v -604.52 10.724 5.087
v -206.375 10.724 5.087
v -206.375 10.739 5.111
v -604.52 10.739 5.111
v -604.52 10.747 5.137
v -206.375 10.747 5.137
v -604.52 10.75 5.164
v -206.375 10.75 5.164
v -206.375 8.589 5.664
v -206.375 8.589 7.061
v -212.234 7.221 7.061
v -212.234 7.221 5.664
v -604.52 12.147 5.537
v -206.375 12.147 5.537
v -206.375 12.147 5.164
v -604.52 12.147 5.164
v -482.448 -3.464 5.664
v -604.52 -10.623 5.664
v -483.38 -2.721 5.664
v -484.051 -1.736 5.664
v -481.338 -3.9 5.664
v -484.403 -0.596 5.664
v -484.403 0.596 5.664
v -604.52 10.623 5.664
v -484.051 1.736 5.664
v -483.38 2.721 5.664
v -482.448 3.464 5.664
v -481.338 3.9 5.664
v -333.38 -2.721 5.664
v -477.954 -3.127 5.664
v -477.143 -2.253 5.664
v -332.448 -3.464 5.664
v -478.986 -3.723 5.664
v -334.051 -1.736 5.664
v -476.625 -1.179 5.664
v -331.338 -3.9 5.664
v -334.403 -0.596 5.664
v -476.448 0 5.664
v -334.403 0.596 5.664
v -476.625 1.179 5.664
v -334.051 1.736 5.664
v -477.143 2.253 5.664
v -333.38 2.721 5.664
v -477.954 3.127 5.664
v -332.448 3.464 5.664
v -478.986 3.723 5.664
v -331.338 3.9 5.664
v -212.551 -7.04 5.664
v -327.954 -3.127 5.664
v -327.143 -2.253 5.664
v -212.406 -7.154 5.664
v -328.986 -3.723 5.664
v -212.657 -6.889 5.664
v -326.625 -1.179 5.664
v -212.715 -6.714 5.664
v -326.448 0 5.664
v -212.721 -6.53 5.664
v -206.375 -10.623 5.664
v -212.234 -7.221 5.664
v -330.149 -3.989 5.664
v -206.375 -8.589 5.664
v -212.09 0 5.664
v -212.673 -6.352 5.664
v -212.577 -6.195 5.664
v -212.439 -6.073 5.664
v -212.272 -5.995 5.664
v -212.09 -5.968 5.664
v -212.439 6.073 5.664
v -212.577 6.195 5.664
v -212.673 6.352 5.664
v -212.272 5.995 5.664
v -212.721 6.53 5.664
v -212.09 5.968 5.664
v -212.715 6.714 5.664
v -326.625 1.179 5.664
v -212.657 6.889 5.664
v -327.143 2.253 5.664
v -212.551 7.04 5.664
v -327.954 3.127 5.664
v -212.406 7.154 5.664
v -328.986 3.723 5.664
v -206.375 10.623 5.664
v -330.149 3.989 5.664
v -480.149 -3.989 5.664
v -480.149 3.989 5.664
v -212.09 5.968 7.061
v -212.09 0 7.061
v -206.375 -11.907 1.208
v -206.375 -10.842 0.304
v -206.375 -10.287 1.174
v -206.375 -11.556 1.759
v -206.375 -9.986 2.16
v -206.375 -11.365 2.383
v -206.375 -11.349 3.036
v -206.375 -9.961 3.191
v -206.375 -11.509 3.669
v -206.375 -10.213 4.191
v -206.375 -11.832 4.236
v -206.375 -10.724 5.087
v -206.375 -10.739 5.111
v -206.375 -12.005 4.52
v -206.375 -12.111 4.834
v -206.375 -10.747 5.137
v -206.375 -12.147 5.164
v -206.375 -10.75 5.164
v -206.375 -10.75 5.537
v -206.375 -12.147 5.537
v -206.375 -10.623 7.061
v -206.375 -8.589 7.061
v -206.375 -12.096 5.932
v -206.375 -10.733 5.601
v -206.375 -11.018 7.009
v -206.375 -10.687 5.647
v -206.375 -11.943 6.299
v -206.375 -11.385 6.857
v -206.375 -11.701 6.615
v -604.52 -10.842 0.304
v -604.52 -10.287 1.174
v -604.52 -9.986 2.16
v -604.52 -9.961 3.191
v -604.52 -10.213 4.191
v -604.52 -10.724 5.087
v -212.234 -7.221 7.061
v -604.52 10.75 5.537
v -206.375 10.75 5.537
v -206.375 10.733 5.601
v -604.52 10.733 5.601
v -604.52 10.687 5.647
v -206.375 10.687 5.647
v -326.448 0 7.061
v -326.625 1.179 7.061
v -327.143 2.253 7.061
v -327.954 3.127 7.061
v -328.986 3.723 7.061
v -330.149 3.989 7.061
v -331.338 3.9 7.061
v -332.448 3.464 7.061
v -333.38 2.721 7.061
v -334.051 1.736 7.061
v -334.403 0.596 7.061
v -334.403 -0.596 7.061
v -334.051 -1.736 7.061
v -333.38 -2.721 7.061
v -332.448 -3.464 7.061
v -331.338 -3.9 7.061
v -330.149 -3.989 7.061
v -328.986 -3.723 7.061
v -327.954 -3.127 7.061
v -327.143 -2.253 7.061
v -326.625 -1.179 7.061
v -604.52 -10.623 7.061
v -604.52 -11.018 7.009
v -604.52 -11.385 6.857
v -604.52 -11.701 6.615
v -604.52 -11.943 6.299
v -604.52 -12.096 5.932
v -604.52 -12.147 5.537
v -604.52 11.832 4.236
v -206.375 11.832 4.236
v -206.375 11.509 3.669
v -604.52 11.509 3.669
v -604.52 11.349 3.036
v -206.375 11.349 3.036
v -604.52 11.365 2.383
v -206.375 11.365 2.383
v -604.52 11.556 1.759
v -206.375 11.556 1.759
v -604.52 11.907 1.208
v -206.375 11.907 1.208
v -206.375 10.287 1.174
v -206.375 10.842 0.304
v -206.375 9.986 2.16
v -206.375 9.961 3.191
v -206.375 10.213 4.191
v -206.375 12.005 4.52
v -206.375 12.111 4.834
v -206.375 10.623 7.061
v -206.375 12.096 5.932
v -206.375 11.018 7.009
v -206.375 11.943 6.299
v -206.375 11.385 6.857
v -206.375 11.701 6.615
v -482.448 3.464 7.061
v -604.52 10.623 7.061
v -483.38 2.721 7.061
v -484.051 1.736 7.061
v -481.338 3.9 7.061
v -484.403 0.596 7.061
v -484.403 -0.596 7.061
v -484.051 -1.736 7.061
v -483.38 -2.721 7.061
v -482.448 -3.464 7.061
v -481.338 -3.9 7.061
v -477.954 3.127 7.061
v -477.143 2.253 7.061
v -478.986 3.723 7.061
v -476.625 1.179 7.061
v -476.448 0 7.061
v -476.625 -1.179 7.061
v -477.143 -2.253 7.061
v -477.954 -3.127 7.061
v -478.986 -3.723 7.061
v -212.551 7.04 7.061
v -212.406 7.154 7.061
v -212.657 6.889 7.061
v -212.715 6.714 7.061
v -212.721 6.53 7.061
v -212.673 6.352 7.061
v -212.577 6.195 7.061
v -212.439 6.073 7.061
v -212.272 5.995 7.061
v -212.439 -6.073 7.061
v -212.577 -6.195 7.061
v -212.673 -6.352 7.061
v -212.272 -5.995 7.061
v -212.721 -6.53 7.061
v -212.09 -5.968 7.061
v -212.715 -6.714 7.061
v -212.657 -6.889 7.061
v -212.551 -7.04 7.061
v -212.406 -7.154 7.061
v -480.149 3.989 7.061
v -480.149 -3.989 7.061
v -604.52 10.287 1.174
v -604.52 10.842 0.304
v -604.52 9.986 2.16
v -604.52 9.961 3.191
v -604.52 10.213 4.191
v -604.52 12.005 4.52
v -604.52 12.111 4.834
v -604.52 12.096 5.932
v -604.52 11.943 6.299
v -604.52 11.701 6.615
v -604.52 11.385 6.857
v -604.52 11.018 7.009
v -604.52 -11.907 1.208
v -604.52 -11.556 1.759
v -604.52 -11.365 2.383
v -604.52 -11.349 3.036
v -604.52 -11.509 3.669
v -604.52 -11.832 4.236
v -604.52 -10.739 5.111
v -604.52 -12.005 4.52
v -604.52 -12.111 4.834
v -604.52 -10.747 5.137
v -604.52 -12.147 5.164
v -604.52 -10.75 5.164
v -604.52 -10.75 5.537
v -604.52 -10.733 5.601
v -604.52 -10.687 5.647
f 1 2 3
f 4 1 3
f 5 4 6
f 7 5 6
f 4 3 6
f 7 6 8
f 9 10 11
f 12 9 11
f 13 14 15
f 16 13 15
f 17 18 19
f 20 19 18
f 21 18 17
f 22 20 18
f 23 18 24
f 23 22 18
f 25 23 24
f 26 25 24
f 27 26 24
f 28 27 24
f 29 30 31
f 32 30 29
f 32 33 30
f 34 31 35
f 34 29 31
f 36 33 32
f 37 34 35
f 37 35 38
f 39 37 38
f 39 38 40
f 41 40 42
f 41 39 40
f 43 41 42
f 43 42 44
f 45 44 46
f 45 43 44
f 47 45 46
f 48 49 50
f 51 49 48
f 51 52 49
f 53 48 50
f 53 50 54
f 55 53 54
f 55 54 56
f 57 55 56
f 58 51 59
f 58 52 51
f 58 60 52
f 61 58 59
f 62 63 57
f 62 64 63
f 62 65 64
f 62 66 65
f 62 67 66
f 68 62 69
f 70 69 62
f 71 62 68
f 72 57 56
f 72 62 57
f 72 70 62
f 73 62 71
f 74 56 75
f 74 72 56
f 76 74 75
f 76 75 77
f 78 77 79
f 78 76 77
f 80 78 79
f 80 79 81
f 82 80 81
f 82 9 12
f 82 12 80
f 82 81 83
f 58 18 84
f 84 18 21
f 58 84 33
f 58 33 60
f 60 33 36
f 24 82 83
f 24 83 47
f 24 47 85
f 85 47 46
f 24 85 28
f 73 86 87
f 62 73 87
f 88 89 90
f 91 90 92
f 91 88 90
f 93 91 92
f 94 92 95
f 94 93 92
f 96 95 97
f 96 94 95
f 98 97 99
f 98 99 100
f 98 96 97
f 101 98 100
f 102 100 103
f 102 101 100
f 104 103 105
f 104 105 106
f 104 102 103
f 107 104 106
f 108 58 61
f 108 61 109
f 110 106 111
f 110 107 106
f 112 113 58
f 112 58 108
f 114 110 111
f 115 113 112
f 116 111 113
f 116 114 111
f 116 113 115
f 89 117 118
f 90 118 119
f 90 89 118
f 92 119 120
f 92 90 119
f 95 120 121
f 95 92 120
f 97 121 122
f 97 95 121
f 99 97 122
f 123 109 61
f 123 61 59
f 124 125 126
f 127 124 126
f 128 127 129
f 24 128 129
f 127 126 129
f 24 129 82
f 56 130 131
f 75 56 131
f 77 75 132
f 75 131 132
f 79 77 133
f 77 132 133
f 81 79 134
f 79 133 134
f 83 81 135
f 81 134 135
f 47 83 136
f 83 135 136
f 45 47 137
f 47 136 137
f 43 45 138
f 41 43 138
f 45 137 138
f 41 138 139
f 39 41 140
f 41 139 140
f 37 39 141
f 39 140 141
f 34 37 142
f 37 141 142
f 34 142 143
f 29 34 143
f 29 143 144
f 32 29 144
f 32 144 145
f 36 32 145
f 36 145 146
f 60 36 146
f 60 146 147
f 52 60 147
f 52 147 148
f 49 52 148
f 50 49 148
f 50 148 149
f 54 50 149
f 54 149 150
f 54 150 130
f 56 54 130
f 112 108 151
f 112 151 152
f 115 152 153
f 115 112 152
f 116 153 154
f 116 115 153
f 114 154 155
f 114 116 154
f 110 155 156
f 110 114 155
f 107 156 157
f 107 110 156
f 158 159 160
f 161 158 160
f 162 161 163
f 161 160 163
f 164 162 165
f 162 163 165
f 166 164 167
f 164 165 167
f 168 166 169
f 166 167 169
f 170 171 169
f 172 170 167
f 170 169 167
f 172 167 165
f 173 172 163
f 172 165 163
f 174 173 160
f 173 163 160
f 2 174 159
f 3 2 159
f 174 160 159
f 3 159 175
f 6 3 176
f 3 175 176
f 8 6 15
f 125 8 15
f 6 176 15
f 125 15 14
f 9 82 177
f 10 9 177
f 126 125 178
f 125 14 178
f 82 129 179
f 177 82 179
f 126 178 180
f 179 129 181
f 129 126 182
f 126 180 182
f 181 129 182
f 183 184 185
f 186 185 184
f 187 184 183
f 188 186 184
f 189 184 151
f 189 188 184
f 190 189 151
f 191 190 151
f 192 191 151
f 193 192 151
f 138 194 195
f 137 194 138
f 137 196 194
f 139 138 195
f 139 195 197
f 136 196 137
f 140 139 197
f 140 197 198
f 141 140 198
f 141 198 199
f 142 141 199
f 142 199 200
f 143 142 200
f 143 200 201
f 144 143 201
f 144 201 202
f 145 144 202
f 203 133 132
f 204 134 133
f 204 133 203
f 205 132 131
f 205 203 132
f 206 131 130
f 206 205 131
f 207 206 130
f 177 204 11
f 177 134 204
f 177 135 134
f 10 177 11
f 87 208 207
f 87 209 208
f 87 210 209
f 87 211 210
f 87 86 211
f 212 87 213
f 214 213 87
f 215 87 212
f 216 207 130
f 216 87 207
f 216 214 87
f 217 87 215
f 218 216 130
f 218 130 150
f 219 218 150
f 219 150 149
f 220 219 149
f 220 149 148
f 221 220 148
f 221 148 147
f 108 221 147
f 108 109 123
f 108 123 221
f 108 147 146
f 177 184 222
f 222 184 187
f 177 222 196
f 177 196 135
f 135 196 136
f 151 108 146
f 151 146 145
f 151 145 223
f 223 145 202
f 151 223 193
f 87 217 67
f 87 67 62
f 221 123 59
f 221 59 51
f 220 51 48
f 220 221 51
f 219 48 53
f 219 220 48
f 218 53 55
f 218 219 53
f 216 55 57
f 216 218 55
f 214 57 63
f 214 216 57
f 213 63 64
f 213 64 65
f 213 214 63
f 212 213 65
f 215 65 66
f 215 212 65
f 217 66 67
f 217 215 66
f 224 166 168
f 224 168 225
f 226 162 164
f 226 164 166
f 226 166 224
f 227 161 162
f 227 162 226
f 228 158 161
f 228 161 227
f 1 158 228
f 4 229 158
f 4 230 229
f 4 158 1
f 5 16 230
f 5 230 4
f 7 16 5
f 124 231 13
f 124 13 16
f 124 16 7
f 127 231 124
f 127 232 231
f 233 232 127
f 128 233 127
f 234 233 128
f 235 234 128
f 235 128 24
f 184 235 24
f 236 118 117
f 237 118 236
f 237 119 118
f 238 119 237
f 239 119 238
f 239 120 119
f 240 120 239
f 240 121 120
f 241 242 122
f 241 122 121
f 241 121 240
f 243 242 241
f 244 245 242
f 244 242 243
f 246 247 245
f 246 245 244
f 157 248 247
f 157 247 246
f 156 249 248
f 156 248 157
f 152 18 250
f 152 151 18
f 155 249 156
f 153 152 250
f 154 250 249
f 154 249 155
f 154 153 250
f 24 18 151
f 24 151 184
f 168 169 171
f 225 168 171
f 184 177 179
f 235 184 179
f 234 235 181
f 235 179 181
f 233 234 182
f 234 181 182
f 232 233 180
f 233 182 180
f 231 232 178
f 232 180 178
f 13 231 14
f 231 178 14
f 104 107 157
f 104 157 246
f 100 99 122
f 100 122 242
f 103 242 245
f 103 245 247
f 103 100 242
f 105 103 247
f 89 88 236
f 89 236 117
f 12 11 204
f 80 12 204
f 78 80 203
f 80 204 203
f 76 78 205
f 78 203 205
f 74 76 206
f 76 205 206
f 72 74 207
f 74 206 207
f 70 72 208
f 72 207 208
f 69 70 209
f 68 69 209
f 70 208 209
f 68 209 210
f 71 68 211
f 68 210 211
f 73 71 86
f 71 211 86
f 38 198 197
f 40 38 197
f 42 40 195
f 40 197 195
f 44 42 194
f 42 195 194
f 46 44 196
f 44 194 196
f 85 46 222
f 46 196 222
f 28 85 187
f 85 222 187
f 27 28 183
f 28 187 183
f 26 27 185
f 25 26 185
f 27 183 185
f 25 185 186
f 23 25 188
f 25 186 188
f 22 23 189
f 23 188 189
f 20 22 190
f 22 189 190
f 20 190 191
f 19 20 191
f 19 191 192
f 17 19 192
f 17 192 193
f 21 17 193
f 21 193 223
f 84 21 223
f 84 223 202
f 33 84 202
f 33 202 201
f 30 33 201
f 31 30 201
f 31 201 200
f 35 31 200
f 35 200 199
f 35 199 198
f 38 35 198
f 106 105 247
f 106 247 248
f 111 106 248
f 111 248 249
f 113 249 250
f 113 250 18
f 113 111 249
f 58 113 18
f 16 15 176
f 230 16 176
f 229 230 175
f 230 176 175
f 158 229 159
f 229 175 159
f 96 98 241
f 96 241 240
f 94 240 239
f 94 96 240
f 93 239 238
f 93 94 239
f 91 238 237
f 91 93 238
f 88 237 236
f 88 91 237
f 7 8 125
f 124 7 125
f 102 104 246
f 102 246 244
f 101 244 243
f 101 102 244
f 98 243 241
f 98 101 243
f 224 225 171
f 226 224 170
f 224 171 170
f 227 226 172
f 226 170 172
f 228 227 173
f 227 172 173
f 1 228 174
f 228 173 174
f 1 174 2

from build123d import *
from build123d.topology import SkipClean

# Parameters (mm, degrees)
EXTRUDE1_DEPTH        = 200.025
MIDDLE_MEMBER_DEPTH   = 400.05
DRAWER_START          = -400.05
DRAWER_MEMBER_DEPTH   = 400.05
SKETCH6_W             = 1.905
SKETCH6_H             = 12.147486483
CUT_EXTRUDE1_DEPTH    = 607.987132866
CUT_EXTRUDE2_DEPTH    = 1.1938
CUT_EXTRUDE3_DEPTH    = 1.397
CUT_EXTRUDE4_DEPTH    = 605.989768868
CUT_EXTRUDE5_DEPTH    = 1.1938
CUT_EXTRUDE14_DEPTH   = 1.1938
CUT_F_DEPTH           = 1.1938
CUT_G_DEPTH           = 1.1938
CUT_EXTRUDE15_DEPTH   = 1.1938
CUT_EXTRUDE17_DEPTH   = 1.2192
LPATTERN1_COUNT       = 6
LPATTERN1_PITCH       = 19.05
EXTRUDE7_DEPTH        = 6.35
EXTRUDE7_DEPTH_BACK   = 101.6
SKETCH28_W            = 7.62
SKETCH28_H            = 0.762
LPATTERN2_COUNT       = 6
LPATTERN2_PITCH       = 19.05
EXTRUDE8_DEPTH        = 6.35
EXTRUDE8_DEPTH_BACK   = 101.6
SKETCH30_W            = 5.08
SKETCH30_H            = 0.762
CROQUIS1_R            = 4
CORTAR_EXTRUIR1_DEPTH = 5


# Read off the part's stored shape, not the designer's step: Drawer Member
with BuildPart() as part:
    # Sketch1 → Extrude1 (new, symmetric)
    with BuildSketch(Plane(origin=(0, 0, 0), x_dir=(0, 0, -1), z_dir=(1, 0, 0))):
        with BuildLine():
            Line((-4.139279899, 22.8203125), (-0.743323143, 22.698920454))
            Line((-0.743323143, 22.698920454), (3.892452069, 22.8203125))
            ThreePointArc((3.892452069, 22.8203125), (5.124499805, 22.338098312), (5.6388, 21.119095664))
            Line((5.6388, 21.119095664), (5.6388, 0))
            Line((5.6388, 0), (4.445, 0))
            Line((4.445, 0), (4.445, 21.119095664))
            ThreePointArc((4.445, 21.119095664), (4.291477554, 21.482977052), (3.92370211, 21.626921585))
            Line((3.92370211, 21.626921585), (0.761857041, 21.544125758))
            ThreePointArc((0.761857041, 21.544125758), (-0.187154328, 21.71413397), (-1.131158407, 21.51822157))
            Line((-1.131158407, 21.51822157), (-4.181926298, 21.627274477))
            ThreePointArc((-4.181926298, 21.627274477), (-4.367367911, 21.55622161), (-4.445, 21.3734366))
            Line((-4.445, 21.3734366), (-4.445, 18.415))
            Line((-4.445, 18.415), (-5.6388, 18.415))
            Line((-5.6388, 18.415), (-5.6388, 21.3734366))
            ThreePointArc((-5.6388, 21.3734366), (-5.19629709, 22.415311161), (-4.139279899, 22.8203125))
        make_face()
    extrude(amount=EXTRUDE1_DEPTH, both=True)

    # Sketch8 → Cut-Extrude2 (cut)
    with BuildSketch(Plane.XY.offset(-4.445)):
        with BuildLine():
            Line((190.386533997, 7.645578895), (191.8208, 7.493000005))
            Line((191.8208, 7.493000005), (191.8208, 0))
            Line((191.8208, 0), (200.025, 0))
            Line((200.025, 0), (200.025, 12.204752384))
            Line((200.025, 12.204752384), (190.628356843, 12.204752384))
            ThreePointArc((190.628356843, 12.204752384), (188.345565723, 10.03983377), (190.386533997, 7.645578895))
        make_face()
    extrude(amount=-CUT_EXTRUDE2_DEPTH, mode=Mode.SUBTRACT)

    # Sketch13 → Cut-Extrude5 (cut)
    with BuildSketch(Plane.XY.offset(-4.445)):
        with BuildLine():
            Line((-131.636699917, 7.112000069), (-156.465199931, 7.112000069))
            ThreePointArc((-156.465199931, 7.112000069), (-157.004015347, 6.888815416), (-157.2272, 6.35))
            Line((-157.2272, 6.35), (-157.2272, 0))
            Line((-157.2272, 0), (-159.5132, 0))
            Line((-159.5132, 0), (-159.5132, 6.35))
            ThreePointArc((-159.5132, 6.35), (-159.736384653, 6.888815416), (-160.275200069, 7.112000069))
            Line((-160.275200069, 7.112000069), (-182.563699917, 7.112000069))
            ThreePointArc((-182.563699917, 7.112000069), (-184.151199917, 8.699500069), (-182.563699917, 10.287000069))
            Line((-182.563699917, 10.287000069), (-131.636699917, 10.287000069))
            ThreePointArc((-131.636699917, 10.287000069), (-130.049199917, 8.699500069), (-131.636699917, 7.112000069))
        make_face()
        with BuildLine():
            Line((-137.250099917, 2.286), (-142.203099917, 2.286))
            ThreePointArc((-142.203099917, 2.286), (-143.819546018, 1.616446102), (-144.489099917, 0))
            Line((-144.489099917, 0), (-134.964099917, 0))
            ThreePointArc((-134.964099917, 0), (-135.633653815, 1.616446102), (-137.250099917, 2.286))
        make_face()
        with BuildLine():
            Line((-176.302599917, 0), (-171.730599917, 0))
            ThreePointArc((-171.730599917, 0), (-174.016599917, 2.286), (-176.302599917, 0))
        make_face()
        with BuildLine():
            Line((-168.200000083, 0), (-161.849999917, 0))
            ThreePointArc((-161.849999917, 0), (-165.025, 3.175000083), (-168.200000083, 0))
        make_face()
        with BuildLine():
            Line((-154.712599917, 0), (-150.140599917, 0))
            ThreePointArc((-150.140599917, 0), (-152.426599917, 2.286), (-154.712599917, 0))
        make_face()
    extrude(amount=-CUT_EXTRUDE5_DEPTH, mode=Mode.SUBTRACT)

    # Sketch32 → Cut-Extrude14 (cut)
    with BuildSketch(Plane(origin=(0, 0, -5.6388), x_dir=(-1, 0, 0), z_dir=(0, 0, -1))):
        with BuildLine():
            Line((19.5625, 0), (29.0875, 0))
            ThreePointArc((29.0875, 0), (28.417946102, 1.616446102), (26.8015, 2.286))
            Line((26.8015, 2.286), (21.8485, 2.286))
            ThreePointArc((21.8485, 2.286), (20.232053898, 1.616446102), (19.5625, 0))
        make_face()
        with BuildLine():
            Line((33.85, 0), (40.2, 0))
            ThreePointArc((40.2, 0), (37.025, 3.175), (33.85, 0))
        make_face()
        with BuildLine():
            Line((43.6925, 0), (53.2175, 0))
            ThreePointArc((53.2175, 0), (52.547946102, 1.616446102), (50.9315, 2.286))
            Line((50.9315, 2.286), (45.9785, 2.286))
            ThreePointArc((45.9785, 2.286), (44.362053898, 1.616446102), (43.6925, 0))
        make_face()
        with BuildLine():
            Line((56.583, 0), (61.155, 0))
            Line((61.155, 0), (61.155, 8.763000069))
            ThreePointArc((61.155, 8.763000069), (60.708630735, 9.840630803), (59.631, 10.287000069))
            Line((59.631, 10.287000069), (16.3875, 10.287000069))
            ThreePointArc((16.3875, 10.287000069), (14.8, 8.699500069), (16.3875, 7.112000069))
            Line((16.3875, 7.112000069), (55.059, 7.112000069))
            ThreePointArc((55.059, 7.112000069), (56.136630735, 6.665630803), (56.583, 5.588000069))
            Line((56.583, 5.588000069), (56.583, 0))
        make_face()
    extrude(amount=-CUT_EXTRUDE14_DEPTH, mode=Mode.SUBTRACT)

    # Sketch33 → Cut F (cut)
    with BuildSketch(Plane(origin=(83.609365602, 0.812450965, -5.6388), x_dir=(-1, 0, 0), z_dir=(0, 0, -1))):
        with BuildLine():
            Line((21.459365602, -0.812450965), (27.809365602, -0.812450965))
            ThreePointArc((27.809365602, -0.812450965), (24.634365602, 2.362549035), (21.459365602, -0.812450965))
        make_face()
        with BuildLine():
            Line((31.301865602, -0.812450965), (40.826865602, -0.812450965))
            ThreePointArc((40.826865602, -0.812450965), (40.157311704, 0.803995136), (38.540865602, 1.473549035))
            Line((38.540865602, 1.473549035), (33.587865602, 1.473549035))
            ThreePointArc((33.587865602, 1.473549035), (31.9714195, 0.803995136), (31.301865602, -0.812450965))
        make_face()
        with BuildLine():
            Line((44.192365602, -0.812450965), (48.764365602, -0.812450965))
            Line((48.764365602, -0.812450965), (48.764365602, 7.950549103))
            ThreePointArc((48.764365602, 7.950549103), (48.317996337, 9.028179838), (47.240365602, 9.474549103))
            Line((47.240365602, 9.474549103), (3.996865602, 9.474549103))
            ThreePointArc((3.996865602, 9.474549103), (2.409365602, 7.887049103), (3.996865602, 6.299549103))
            Line((3.996865602, 6.299549103), (42.668365602, 6.299549103))
            ThreePointArc((42.668365602, 6.299549103), (43.745996337, 5.853179838), (44.192365602, 4.775549103))
            Line((44.192365602, 4.775549103), (44.192365602, -0.812450965))
        make_face()
        with BuildLine():
            Line((9.648365602, -0.812450965), (14.220365602, -0.812450965))
            ThreePointArc((14.220365602, -0.812450965), (11.934365602, 1.473549035), (9.648365602, -0.812450965))
        make_face()
    extrude(amount=-CUT_F_DEPTH, mode=Mode.SUBTRACT)

    # Sketch34 → Cut G (cut)
    with BuildSketch(Plane(origin=(169.823604257, 1.452669916, -5.6388), x_dir=(-1, 0, 0), z_dir=(0, 0, -1))):
        with BuildLine():
            Line((-2.653895743, -1.452669916), (6.871104257, -1.452669916))
            ThreePointArc((6.871104257, -1.452669916), (6.201550358, 0.163776186), (4.585104257, 0.833330084))
            Line((4.585104257, 0.833330084), (-0.367895743, 0.833330084))
            ThreePointArc((-0.367895743, 0.833330084), (-1.984341845, 0.163776186), (-2.653895743, -1.452669916))
        make_face()
        with BuildLine():
            Line((11.633604257, -1.452669916), (17.983604257, -1.452669916))
            ThreePointArc((17.983604257, -1.452669916), (14.808604257, 1.722330084), (11.633604257, -1.452669916))
        make_face()
        with BuildLine():
            Line((21.476104257, -1.452669916), (31.001104257, -1.452669916))
            ThreePointArc((31.001104257, -1.452669916), (30.331550358, 0.163776186), (28.715104257, 0.833330084))
            Line((28.715104257, 0.833330084), (23.762104257, 0.833330084))
            ThreePointArc((23.762104257, 0.833330084), (22.145658155, 0.163776186), (21.476104257, -1.452669916))
        make_face()
        with BuildLine():
            Line((34.366604257, -1.452669916), (38.938604257, -1.452669916))
            Line((38.938604257, -1.452669916), (38.938604257, 7.310330153))
            ThreePointArc((38.938604257, 7.310330153), (38.492234991, 8.387960887), (37.414604257, 8.834330153))
            Line((37.414604257, 8.834330153), (-5.828895743, 8.834330153))
            ThreePointArc((-5.828895743, 8.834330153), (-7.416395743, 7.246830153), (-5.828895743, 5.659330153))
            Line((-5.828895743, 5.659330153), (32.842604257, 5.659330153))
            ThreePointArc((32.842604257, 5.659330153), (33.920234991, 5.212960887), (34.366604257, 4.135330153))
            Line((34.366604257, 4.135330153), (34.366604257, -1.452669916))
        make_face()
    extrude(amount=-CUT_G_DEPTH, mode=Mode.SUBTRACT)

    # Sketch31 → Cut-Extrude15 (cut)
    with BuildSketch(Plane(origin=(0, 0, -5.6388), x_dir=(-1, 0, 0), z_dir=(0, 0, -1))):
        with BuildLine():
            Line((-184.15, 0), (-177.8, 0))
            ThreePointArc((-177.8, 0), (-180.975, 3.175), (-184.15, 0))
        make_face()
    extrude(amount=-CUT_EXTRUDE15_DEPTH, mode=Mode.SUBTRACT)

    # Mirror3 3: part across plane


with BuildPart() as body_2:
    # Sketch2 → Middle Member (new body)
    with BuildSketch(Plane.ZY.offset(403.225)):
        with BuildLine():
            ThreePointArc((5.7404, 15.627692517), (3.735864231, 17.127444277), (1.241474216, 16.914283663))
            ThreePointArc((1.241474216, 16.914283663), (-0.188944013, 16.688900955), (-1.505642365, 17.291560999))
            ThreePointArc((-1.505642365, 17.291560999), (-2.813430342, 17.487614783), (-3.53059999, 16.376572852))
            Line((-3.53059999, 16.376572852), (-3.53059999, 9.521737984))
            ThreePointArc((-3.53059999, 9.521737984), (-3.220327109, 8.457239952), (-2.386691239, 7.726160915))
            Line((-2.386691239, 7.726160915), (-0.414564934, 6.806543316))
            ThreePointArc((-0.414564934, 6.806543316), (-0.093935732, 6.525359052), (0.0254, 6.115936705))
            Line((0.0254, 6.115936705), (0.0254, 0))
            Line((0.0254, 0), (1.2446, 0))
            Line((1.2446, 0), (1.2446, 6.115936705))
            ThreePointArc((1.2446, 6.115936705), (0.934327119, 7.180434735), (0.100691251, 7.91151377))
            Line((0.100691251, 7.91151377), (-1.871435054, 8.831131369))
            ThreePointArc((-1.871435054, 8.831131369), (-2.192064258, 9.112315634), (-2.31139999, 9.521737984))
            Line((-2.31139999, 9.521737984), (-2.31139999, 16.376572852))
            ThreePointArc((-2.31139999, 16.376572852), (-2.311399987, 16.376572856), (-2.311399982, 16.376572855))
            ThreePointArc((-2.311399982, 16.376572855), (-0.35482671, 15.481038557), (1.770730805, 15.815950333))
            ThreePointArc((1.770730805, 15.815950333), (3.400639083, 15.955235789), (4.710462095, 14.975253591))
            Line((4.710462095, 14.975253591), (5.7404, 15.627692517))
        make_face()
    extrude(amount=-MIDDLE_MEMBER_DEPTH)

    # Sketch12 → Cut-Extrude4 (cut, through all)
    with BuildSketch(Plane.XY.offset(1.2446)):
        with BuildLine():
            Line((-3.175, 12.065), (-13.335, 12.065))
            ThreePointArc((-13.335, 12.065), (-15.131051224, 11.321051224), (-15.875, 9.525))
            Line((-15.875, 9.525), (-15.875, 0))
            Line((-15.875, 0), (-3.175, 0))
            Line((-3.175, 0), (-3.175, 12.065))
        make_face()
    extrude(amount=-CUT_EXTRUDE4_DEPTH, mode=Mode.SUBTRACT)

    # Sketch26 → Cut-Extrude17 (cut)
    with BuildSketch(Plane.XY.offset(1.2446)):
        with BuildLine():
            Line((-176.302599917, 0), (-134.964099917, 0))
            ThreePointArc((-134.964099917, 0), (-136.377602591, 3.412497326), (-139.790099917, 4.826))
            Line((-139.790099917, 4.826), (-171.476599917, 4.826))
            ThreePointArc((-171.476599917, 4.826), (-174.889097243, 3.412497326), (-176.302599917, 0))
        make_face()
        with BuildLine():
            Line((-19.5625, 0), (-53.2175, 0))
            ThreePointArc((-53.2175, 0), (-51.803997326, 3.412497326), (-48.3915, 4.826))
            Line((-48.3915, 4.826), (-24.3885, 4.826))
            ThreePointArc((-24.3885, 4.826), (-20.976002674, 3.412497326), (-19.5625, 0))
        make_face()
        with BuildLine():
            Line((76.4375, 0), (42.7825, 0))
            ThreePointArc((42.7825, 0), (44.196002674, 3.412497326), (47.6085, 4.826))
            Line((47.6085, 4.826), (71.6115, 4.826))
            ThreePointArc((71.6115, 4.826), (75.023997326, 3.412497326), (76.4375, 0))
        make_face()
    extrude(amount=-CUT_EXTRUDE17_DEPTH, mode=Mode.SUBTRACT)

    # Mirror3 2: body 2 across plane


with BuildPart() as body_3:
    # Drawer Member outline → Drawer Member (new body)
    with BuildSketch(Plane.ZY.offset(606.425).offset(DRAWER_START)):
        with BuildLine():
            Line((5.6642, 0), (7.0612, 0))
            Line((7.0612, 0), (7.0612, 10.623486483))
            ThreePointArc((7.0612, 10.623486483), (6.614830734, 11.701117218), (5.5372, 12.147486483))
            Line((5.5372, 12.147486483), (5.164341455, 12.147486483))
            ThreePointArc((5.164341455, 12.147486483), (4.67440708, 12.066587417), (4.236487447, 11.83247901))
            ThreePointArc((4.236487447, 11.83247901), (2.709144677, 11.334862777), (1.208194452, 11.907179363))
            Line((1.208194452, 11.907179363), (0.304054167, 10.842219578))
            ThreePointArc((0.304054167, 10.842219578), (2.674694689, 9.938287609), (5.087020295, 10.724235863))
            ThreePointArc((5.087020295, 10.724235863), (5.123513594, 10.743744895), (5.164341455, 10.750486483))
            Line((5.164341455, 10.750486483), (5.5372, 10.750486483))
            ThreePointArc((5.5372, 10.750486483), (5.627002561, 10.713289044), (5.6642, 10.623486483))
            Line((5.6642, 10.623486483), (5.6642, 0))
        make_face()
    extrude(amount=DRAWER_MEMBER_DEPTH)

    # Sketch6 → Cut-Extrude1 (cut, through all)
    with BuildSketch(Plane.XY.offset(7.0612)):
        with Locations((-605.4725, 6.073743242)):
            Rectangle(SKETCH6_W, SKETCH6_H)
    extrude(amount=-CUT_EXTRUDE1_DEPTH, mode=Mode.SUBTRACT)

    # Sketch11 → Cut-Extrude3 (cut)
    with BuildSketch(Plane.XY.offset(7.0612)):
        with BuildLine():
            Line((-212.089951398, 5.967847879), (-212.09, 0))
            Line((-212.09, 0), (-206.375, 0))
            Line((-206.375, 0), (-206.375, 8.589285844))
            Line((-206.375, 8.589285844), (-212.234326457, 7.221216084))
            ThreePointArc((-212.234326457, 7.221216084), (-212.720774848, 6.530182899), (-212.089951398, 5.967847879))
        make_face()
    extrude(amount=-CUT_EXTRUDE3_DEPTH, mode=Mode.SUBTRACT)

    # Mirror3: body 3 across plane


with BuildPart() as body_4:
    # Sketch27 → Revolve1 (revolve)
    with BuildSketch(Plane.ZY.offset(187.325)):
        with BuildLine():
            Line((0.1524, 21.683172421), (0.1524, 16.665571078))
            ThreePointArc((0.1524, 16.665571078), (2.661200671, 19.174371749), (0.1524, 21.683172421))
        make_face()
    revolve(axis=Axis((-187.325, 23.635004298, 0.1524), (0, -1, 0)))


with BuildPart() as lpattern1_1:
    # LPattern1: pattern copy
    add(body_4.part.moved(Location(Vector(1, 0, 0) * (1 * LPATTERN1_PITCH))))


with BuildPart() as lpattern1_2:
    # LPattern1: pattern copy
    add(body_4.part.moved(Location(Vector(1, 0, 0) * (2 * LPATTERN1_PITCH))))


with BuildPart() as lpattern1_3:
    # LPattern1: pattern copy
    add(body_4.part.moved(Location(Vector(1, 0, 0) * (3 * LPATTERN1_PITCH))))


with BuildPart() as lpattern1_4:
    # LPattern1: pattern copy
    add(body_4.part.moved(Location(Vector(1, 0, 0) * (4 * LPATTERN1_PITCH))))


with BuildPart() as lpattern1_5:
    # LPattern1: pattern copy
    add(body_4.part.moved(Location(Vector(1, 0, 0) * (5 * LPATTERN1_PITCH))))


with BuildPart() as body_4_1:
    add(body_4.part)

    add(lpattern1_1.part)  # Extrude7 merges LPattern1_1

    add(lpattern1_2.part)  # Extrude7 merges LPattern1_2

    add(lpattern1_3.part)  # Extrude7 merges LPattern1_3

    add(lpattern1_4.part)  # Extrude7 merges LPattern1_4

    add(lpattern1_5.part)  # Extrude7 merges LPattern1_5
    # Sketch28 → Extrude7 (add, two sides: drawn at the far end of the back side and taken through both)
    with BuildSketch(Plane.ZY.offset(187.325).offset(-EXTRUDE7_DEPTH_BACK)):
        with Locations((0.1524, 19.174371749)):
            Rectangle(SKETCH28_W, SKETCH28_H)
    extrude(amount=EXTRUDE7_DEPTH + EXTRUDE7_DEPTH_BACK)


with BuildPart() as body_5:
    # Sketch29 → Revolve2 (revolve)
    with BuildSketch(Plane.ZY.offset(365.125)):
        with BuildLine():
            Line((2.7686, 16.043834368), (2.7686, 11.446434358))
            ThreePointArc((2.7686, 11.446434358), (5.067300005, 13.745134363), (2.7686, 16.043834368))
        make_face()
    revolve(axis=Axis((-365.125, 16.680143034, 2.7686), (0, -1, 0)))


with BuildPart() as lpattern2_1:
    # LPattern2: pattern copy
    add(body_5.part.moved(Location(Vector(1, 0, 0) * (1 * LPATTERN2_PITCH))))


with BuildPart() as lpattern2_2:
    # LPattern2: pattern copy
    add(body_5.part.moved(Location(Vector(1, 0, 0) * (2 * LPATTERN2_PITCH))))


with BuildPart() as lpattern2_3:
    # LPattern2: pattern copy
    add(body_5.part.moved(Location(Vector(1, 0, 0) * (3 * LPATTERN2_PITCH))))


with BuildPart() as lpattern2_4:
    # LPattern2: pattern copy
    add(body_5.part.moved(Location(Vector(1, 0, 0) * (4 * LPATTERN2_PITCH))))


with BuildPart() as lpattern2_5:
    # LPattern2: pattern copy
    add(body_5.part.moved(Location(Vector(1, 0, 0) * (5 * LPATTERN2_PITCH))))


with BuildPart() as body_5_1:
    add(body_5.part)

    add(lpattern2_1.part)  # Extrude8 merges LPattern2_1

    add(lpattern2_2.part)  # Extrude8 merges LPattern2_2

    add(lpattern2_3.part)  # Extrude8 merges LPattern2_3

    add(lpattern2_4.part)  # Extrude8 merges LPattern2_4

    add(lpattern2_5.part)  # Extrude8 merges LPattern2_5
    # Sketch30 → Extrude8 (add, two sides: drawn at the far end of the back side and taken through both)
    with BuildSketch(Plane.ZY.offset(365.125).offset(-EXTRUDE8_DEPTH_BACK)):
        with Locations((2.7686, 13.745134363)):
            Rectangle(SKETCH30_W, SKETCH30_H)
    extrude(amount=EXTRUDE8_DEPTH + EXTRUDE8_DEPTH_BACK)


with BuildPart() as body_3_1:
    add(body_3.part)
    add(body_3.part.mirror(Plane.ZX))

    # Croquis1 → Cortar-Extruir1 (cut)
    with BuildSketch(Plane.XY.offset(7.0612)):
        with Locations((-330.4475, 0)):
            Circle(CROQUIS1_R)
        with Locations((-480.4475, 0)):
            Circle(CROQUIS1_R)
    extrude(amount=-CORTAR_EXTRUIR1_DEPTH, mode=Mode.SUBTRACT)


with BuildPart() as body_2_1:
    add(body_2.part)
    add(body_2.part.mirror(Plane.ZX))


with BuildPart() as part_1:
    with SkipClean():  # the faces are left unmerged after this step: merging them gives an invalid solid
        add(part.part)
        add(part.part.mirror(Plane.ZX))


with BuildPart() as body_6:
    # Mirror5: mirrored copy
    add(body_5_1.part.mirror(Plane.ZX))


with BuildPart() as body_7:
    # Mirror5 2: mirrored copy
    add(body_4_1.part.mirror(Plane.ZX))


solid = body_3_1.part
